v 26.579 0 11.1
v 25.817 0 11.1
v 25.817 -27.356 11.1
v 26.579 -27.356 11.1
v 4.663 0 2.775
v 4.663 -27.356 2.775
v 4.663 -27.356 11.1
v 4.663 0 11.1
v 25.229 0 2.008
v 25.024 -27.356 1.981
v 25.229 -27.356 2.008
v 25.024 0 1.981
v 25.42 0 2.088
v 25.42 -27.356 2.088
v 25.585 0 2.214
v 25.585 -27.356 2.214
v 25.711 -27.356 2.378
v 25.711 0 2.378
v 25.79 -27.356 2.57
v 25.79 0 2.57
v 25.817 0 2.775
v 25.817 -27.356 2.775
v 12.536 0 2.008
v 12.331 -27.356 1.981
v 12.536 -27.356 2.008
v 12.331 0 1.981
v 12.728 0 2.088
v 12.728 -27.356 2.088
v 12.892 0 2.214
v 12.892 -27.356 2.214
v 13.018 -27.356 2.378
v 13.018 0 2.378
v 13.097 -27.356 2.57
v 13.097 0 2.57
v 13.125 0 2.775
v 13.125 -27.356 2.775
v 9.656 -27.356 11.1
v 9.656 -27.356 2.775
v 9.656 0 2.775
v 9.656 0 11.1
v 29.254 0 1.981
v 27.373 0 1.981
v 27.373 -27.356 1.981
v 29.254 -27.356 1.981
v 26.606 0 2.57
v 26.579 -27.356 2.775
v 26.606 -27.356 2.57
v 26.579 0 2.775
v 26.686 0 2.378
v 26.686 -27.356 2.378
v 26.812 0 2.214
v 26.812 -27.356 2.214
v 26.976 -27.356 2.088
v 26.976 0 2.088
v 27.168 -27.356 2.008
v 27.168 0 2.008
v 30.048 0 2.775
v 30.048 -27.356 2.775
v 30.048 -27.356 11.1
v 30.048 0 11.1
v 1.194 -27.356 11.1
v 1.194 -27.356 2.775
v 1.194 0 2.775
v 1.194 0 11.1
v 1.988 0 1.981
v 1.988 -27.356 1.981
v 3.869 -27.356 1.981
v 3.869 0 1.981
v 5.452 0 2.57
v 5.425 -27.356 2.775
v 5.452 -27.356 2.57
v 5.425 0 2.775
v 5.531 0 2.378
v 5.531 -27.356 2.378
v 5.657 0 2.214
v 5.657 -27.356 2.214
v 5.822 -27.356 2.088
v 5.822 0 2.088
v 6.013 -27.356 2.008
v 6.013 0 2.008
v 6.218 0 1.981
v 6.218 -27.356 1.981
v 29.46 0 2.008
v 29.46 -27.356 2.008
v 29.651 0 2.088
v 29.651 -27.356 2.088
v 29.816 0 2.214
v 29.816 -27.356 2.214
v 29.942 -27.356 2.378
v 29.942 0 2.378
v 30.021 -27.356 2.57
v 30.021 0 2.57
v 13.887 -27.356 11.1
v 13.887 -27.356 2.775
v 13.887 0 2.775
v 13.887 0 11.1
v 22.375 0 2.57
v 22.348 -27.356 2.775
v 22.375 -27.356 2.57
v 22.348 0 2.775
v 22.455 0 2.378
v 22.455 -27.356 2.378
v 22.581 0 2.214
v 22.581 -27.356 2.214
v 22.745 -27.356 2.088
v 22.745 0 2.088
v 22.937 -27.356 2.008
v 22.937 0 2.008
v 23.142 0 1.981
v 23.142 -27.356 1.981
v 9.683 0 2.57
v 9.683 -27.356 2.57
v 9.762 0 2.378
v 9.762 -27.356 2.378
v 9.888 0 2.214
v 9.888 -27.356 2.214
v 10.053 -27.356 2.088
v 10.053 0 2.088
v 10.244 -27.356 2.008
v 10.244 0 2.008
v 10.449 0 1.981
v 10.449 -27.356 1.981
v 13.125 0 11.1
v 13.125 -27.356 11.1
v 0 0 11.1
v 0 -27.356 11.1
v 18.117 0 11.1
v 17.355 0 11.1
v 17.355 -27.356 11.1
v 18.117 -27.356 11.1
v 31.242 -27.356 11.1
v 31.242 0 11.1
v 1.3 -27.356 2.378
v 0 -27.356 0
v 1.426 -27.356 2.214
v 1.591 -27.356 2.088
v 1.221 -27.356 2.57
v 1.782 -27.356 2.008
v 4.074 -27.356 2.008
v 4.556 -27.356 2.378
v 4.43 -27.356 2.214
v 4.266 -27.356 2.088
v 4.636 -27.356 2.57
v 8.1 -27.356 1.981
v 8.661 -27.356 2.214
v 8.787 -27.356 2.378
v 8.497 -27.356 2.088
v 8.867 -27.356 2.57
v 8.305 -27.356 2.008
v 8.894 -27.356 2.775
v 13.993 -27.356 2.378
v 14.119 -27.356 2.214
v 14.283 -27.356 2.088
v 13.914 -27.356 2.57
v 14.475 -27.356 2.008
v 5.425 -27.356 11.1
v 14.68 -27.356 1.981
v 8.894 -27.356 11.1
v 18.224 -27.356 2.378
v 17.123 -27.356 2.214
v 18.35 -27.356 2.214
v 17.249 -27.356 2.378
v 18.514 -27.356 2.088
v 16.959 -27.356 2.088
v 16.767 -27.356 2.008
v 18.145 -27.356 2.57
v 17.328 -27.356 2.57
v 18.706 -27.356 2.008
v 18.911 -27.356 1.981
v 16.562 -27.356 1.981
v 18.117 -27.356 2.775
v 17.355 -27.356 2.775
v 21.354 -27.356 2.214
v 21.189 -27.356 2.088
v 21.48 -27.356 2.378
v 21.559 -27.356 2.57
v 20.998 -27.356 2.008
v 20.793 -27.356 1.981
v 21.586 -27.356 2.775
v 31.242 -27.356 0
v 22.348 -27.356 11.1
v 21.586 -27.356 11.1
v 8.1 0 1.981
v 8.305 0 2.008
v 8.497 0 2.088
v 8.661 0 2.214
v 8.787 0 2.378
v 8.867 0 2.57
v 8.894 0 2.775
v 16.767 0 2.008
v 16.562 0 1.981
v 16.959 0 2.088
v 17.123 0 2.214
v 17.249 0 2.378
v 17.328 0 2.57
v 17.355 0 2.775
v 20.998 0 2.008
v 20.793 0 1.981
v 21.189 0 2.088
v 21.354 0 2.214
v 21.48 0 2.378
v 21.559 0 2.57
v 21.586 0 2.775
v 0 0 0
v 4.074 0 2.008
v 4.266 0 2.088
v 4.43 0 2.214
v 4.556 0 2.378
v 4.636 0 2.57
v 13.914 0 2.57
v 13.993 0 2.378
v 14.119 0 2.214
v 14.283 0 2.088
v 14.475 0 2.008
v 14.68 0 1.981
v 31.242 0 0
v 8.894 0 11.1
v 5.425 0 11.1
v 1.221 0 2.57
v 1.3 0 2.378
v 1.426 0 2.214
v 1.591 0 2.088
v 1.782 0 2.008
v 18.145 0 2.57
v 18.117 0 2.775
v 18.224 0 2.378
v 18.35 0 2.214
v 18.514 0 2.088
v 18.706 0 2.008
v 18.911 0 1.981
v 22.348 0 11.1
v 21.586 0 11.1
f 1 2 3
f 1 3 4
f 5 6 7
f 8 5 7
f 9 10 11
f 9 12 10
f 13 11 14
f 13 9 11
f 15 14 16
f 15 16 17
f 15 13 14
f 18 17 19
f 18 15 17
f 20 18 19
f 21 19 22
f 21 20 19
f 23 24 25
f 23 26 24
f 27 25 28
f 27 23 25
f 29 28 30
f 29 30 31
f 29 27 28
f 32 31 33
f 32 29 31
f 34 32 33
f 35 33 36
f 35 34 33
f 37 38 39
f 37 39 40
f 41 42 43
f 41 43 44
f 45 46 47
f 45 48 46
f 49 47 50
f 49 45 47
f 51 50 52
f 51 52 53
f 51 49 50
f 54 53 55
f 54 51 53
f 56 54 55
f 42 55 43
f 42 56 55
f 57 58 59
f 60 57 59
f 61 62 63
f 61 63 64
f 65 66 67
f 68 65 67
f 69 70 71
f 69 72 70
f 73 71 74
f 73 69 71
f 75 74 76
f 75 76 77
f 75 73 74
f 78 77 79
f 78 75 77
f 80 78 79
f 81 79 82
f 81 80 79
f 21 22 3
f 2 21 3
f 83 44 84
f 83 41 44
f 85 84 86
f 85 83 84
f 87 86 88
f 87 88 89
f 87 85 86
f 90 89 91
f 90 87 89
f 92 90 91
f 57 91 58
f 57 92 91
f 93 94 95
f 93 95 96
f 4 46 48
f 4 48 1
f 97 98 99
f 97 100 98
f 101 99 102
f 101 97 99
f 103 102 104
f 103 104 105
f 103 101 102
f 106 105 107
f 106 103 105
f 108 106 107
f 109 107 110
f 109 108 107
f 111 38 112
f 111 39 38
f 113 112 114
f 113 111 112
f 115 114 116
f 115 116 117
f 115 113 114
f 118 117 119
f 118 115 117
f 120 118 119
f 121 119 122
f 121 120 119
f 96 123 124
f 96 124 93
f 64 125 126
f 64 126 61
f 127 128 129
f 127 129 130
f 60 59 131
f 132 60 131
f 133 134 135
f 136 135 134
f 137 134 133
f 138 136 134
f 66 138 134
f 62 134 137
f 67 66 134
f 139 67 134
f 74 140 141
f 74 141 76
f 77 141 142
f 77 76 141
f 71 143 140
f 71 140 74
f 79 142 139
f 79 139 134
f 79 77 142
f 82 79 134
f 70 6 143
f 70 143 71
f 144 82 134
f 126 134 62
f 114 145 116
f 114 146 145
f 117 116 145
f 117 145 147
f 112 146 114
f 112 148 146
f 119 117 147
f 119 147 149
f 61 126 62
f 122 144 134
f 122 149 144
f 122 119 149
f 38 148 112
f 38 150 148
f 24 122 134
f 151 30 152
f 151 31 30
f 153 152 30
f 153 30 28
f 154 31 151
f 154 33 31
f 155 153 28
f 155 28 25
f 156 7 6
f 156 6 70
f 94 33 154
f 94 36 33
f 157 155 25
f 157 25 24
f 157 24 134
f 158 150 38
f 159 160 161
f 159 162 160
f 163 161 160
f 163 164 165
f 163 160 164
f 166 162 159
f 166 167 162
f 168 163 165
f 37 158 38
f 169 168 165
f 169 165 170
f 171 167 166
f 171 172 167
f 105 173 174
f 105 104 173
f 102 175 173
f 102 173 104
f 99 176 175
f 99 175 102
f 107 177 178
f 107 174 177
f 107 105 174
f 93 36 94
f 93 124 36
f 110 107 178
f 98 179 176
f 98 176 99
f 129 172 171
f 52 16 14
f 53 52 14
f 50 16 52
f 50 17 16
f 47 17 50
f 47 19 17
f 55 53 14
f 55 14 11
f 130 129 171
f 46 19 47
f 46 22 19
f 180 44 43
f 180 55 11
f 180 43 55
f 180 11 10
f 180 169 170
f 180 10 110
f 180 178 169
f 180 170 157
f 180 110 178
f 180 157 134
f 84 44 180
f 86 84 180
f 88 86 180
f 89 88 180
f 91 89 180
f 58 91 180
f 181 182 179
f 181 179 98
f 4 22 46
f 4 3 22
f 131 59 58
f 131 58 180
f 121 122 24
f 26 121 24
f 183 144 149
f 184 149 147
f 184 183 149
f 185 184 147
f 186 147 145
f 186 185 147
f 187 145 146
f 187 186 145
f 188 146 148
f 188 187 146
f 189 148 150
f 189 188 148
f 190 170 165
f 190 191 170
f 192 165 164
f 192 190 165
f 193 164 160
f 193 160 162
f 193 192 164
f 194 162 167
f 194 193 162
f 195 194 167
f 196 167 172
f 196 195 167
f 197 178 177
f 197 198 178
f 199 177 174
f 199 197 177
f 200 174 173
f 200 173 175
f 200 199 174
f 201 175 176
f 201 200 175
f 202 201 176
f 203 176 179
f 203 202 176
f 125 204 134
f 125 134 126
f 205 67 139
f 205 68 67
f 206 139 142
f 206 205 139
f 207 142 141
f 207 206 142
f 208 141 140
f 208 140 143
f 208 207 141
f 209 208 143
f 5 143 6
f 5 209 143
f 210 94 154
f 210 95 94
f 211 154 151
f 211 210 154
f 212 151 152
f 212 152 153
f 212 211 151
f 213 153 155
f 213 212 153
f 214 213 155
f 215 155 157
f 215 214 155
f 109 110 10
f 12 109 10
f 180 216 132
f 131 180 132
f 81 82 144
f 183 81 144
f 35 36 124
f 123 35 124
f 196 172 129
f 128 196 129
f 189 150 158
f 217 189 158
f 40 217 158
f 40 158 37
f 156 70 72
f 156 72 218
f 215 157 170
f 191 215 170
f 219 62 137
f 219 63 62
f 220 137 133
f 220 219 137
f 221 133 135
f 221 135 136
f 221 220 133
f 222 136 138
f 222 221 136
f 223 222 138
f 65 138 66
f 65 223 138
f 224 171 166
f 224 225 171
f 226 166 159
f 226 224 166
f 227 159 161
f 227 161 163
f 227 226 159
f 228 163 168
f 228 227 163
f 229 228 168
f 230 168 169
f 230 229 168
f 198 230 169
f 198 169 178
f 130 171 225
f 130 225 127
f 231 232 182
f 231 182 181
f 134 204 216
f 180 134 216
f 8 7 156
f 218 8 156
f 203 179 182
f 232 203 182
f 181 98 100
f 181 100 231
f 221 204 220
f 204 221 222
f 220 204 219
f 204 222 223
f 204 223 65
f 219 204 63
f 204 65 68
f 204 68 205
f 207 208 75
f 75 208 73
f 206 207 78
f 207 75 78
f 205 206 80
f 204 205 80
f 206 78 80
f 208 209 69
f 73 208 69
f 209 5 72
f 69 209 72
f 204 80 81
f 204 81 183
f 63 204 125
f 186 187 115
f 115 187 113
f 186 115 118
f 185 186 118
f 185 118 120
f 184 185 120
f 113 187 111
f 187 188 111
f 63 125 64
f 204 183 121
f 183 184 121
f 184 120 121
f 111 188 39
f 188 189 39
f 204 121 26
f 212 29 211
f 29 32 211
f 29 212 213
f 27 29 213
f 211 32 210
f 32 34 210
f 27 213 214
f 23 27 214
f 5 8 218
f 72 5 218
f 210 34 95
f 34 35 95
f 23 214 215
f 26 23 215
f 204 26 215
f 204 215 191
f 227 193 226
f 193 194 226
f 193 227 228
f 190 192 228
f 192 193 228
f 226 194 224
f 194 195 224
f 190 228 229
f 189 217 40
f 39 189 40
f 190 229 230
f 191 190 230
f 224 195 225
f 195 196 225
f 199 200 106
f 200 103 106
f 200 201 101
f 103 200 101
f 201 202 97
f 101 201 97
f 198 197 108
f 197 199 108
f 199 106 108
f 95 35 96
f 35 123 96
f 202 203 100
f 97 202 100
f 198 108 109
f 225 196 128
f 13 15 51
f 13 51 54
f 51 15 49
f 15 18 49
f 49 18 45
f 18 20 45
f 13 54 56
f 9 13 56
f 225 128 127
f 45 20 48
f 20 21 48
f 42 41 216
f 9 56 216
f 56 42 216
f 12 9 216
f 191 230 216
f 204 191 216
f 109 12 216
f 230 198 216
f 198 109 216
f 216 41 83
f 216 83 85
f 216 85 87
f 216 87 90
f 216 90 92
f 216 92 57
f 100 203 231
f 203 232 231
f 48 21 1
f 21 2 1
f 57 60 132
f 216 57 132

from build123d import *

# Parameters (mm, degrees)
F0_W     = 31.242
F0_H     = 11.0998
F1_DEPTH = 27.3558
F2_W     = 3.468914
F2_H     = 9.1186
F2_W_2   = 3.468915
F3_DEPTH = 27.3568
F4_R     = 0.79375


with BuildPart() as f1:
    # F0 (on Front) → F1 (new body)
    with BuildSketch(Plane.XZ):
        with Locations((15.621, 5.5499)):
            Rectangle(F0_W, F0_H)
    extrude(amount=F1_DEPTH)

    # F2 (on face) → F3 (cut, through all)
    with BuildSketch(Plane.XZ.offset(27.3558)):
        with Locations((2.928257, 6.5405)):
            Rectangle(F2_W, F2_H)
        with Locations((7.159171, 6.5405)):
            Rectangle(F2_W_2, F2_H)
        with Locations((11.390086, 6.5405)):
            Rectangle(F2_W, F2_H)
        with Locations((15.621, 6.5405)):
            Rectangle(F2_W, F2_H)
        with Locations((19.851914, 6.5405)):
            Rectangle(F2_W, F2_H)
        with Locations((24.082828, 6.5405)):
            Rectangle(F2_W_2, F2_H)
        with Locations((28.313743, 6.5405)):
            Rectangle(F2_W, F2_H)
    extrude(amount=-F3_DEPTH, mode=Mode.SUBTRACT)

    # F4
    f4_edges = [f1.edges().sort_by_distance(p)[0] for p in [
        (1.1938, -13.6779, 1.9812),
        (4.662714, -13.6779, 1.9812),
        (5.424714, -13.6779, 1.9812),
        (8.893629, -13.6779, 1.9812),
        (9.655629, -13.6779, 1.9812),
        (13.124543, -13.6779, 1.9812),
        (13.886543, -13.6779, 1.9812),
        (17.355457, -13.6779, 1.9812),
        (18.117457, -13.6779, 1.9812),
        (21.586371, -13.6779, 1.9812),
        (22.348371, -13.6779, 1.9812),
        (25.817286, -13.6779, 1.9812),
        (26.579286, -13.6779, 1.9812),
        (30.0482, -13.6779, 1.9812),
    ]]
    fillet(f4_edges, radius=F4_R)


solid = f1.part
